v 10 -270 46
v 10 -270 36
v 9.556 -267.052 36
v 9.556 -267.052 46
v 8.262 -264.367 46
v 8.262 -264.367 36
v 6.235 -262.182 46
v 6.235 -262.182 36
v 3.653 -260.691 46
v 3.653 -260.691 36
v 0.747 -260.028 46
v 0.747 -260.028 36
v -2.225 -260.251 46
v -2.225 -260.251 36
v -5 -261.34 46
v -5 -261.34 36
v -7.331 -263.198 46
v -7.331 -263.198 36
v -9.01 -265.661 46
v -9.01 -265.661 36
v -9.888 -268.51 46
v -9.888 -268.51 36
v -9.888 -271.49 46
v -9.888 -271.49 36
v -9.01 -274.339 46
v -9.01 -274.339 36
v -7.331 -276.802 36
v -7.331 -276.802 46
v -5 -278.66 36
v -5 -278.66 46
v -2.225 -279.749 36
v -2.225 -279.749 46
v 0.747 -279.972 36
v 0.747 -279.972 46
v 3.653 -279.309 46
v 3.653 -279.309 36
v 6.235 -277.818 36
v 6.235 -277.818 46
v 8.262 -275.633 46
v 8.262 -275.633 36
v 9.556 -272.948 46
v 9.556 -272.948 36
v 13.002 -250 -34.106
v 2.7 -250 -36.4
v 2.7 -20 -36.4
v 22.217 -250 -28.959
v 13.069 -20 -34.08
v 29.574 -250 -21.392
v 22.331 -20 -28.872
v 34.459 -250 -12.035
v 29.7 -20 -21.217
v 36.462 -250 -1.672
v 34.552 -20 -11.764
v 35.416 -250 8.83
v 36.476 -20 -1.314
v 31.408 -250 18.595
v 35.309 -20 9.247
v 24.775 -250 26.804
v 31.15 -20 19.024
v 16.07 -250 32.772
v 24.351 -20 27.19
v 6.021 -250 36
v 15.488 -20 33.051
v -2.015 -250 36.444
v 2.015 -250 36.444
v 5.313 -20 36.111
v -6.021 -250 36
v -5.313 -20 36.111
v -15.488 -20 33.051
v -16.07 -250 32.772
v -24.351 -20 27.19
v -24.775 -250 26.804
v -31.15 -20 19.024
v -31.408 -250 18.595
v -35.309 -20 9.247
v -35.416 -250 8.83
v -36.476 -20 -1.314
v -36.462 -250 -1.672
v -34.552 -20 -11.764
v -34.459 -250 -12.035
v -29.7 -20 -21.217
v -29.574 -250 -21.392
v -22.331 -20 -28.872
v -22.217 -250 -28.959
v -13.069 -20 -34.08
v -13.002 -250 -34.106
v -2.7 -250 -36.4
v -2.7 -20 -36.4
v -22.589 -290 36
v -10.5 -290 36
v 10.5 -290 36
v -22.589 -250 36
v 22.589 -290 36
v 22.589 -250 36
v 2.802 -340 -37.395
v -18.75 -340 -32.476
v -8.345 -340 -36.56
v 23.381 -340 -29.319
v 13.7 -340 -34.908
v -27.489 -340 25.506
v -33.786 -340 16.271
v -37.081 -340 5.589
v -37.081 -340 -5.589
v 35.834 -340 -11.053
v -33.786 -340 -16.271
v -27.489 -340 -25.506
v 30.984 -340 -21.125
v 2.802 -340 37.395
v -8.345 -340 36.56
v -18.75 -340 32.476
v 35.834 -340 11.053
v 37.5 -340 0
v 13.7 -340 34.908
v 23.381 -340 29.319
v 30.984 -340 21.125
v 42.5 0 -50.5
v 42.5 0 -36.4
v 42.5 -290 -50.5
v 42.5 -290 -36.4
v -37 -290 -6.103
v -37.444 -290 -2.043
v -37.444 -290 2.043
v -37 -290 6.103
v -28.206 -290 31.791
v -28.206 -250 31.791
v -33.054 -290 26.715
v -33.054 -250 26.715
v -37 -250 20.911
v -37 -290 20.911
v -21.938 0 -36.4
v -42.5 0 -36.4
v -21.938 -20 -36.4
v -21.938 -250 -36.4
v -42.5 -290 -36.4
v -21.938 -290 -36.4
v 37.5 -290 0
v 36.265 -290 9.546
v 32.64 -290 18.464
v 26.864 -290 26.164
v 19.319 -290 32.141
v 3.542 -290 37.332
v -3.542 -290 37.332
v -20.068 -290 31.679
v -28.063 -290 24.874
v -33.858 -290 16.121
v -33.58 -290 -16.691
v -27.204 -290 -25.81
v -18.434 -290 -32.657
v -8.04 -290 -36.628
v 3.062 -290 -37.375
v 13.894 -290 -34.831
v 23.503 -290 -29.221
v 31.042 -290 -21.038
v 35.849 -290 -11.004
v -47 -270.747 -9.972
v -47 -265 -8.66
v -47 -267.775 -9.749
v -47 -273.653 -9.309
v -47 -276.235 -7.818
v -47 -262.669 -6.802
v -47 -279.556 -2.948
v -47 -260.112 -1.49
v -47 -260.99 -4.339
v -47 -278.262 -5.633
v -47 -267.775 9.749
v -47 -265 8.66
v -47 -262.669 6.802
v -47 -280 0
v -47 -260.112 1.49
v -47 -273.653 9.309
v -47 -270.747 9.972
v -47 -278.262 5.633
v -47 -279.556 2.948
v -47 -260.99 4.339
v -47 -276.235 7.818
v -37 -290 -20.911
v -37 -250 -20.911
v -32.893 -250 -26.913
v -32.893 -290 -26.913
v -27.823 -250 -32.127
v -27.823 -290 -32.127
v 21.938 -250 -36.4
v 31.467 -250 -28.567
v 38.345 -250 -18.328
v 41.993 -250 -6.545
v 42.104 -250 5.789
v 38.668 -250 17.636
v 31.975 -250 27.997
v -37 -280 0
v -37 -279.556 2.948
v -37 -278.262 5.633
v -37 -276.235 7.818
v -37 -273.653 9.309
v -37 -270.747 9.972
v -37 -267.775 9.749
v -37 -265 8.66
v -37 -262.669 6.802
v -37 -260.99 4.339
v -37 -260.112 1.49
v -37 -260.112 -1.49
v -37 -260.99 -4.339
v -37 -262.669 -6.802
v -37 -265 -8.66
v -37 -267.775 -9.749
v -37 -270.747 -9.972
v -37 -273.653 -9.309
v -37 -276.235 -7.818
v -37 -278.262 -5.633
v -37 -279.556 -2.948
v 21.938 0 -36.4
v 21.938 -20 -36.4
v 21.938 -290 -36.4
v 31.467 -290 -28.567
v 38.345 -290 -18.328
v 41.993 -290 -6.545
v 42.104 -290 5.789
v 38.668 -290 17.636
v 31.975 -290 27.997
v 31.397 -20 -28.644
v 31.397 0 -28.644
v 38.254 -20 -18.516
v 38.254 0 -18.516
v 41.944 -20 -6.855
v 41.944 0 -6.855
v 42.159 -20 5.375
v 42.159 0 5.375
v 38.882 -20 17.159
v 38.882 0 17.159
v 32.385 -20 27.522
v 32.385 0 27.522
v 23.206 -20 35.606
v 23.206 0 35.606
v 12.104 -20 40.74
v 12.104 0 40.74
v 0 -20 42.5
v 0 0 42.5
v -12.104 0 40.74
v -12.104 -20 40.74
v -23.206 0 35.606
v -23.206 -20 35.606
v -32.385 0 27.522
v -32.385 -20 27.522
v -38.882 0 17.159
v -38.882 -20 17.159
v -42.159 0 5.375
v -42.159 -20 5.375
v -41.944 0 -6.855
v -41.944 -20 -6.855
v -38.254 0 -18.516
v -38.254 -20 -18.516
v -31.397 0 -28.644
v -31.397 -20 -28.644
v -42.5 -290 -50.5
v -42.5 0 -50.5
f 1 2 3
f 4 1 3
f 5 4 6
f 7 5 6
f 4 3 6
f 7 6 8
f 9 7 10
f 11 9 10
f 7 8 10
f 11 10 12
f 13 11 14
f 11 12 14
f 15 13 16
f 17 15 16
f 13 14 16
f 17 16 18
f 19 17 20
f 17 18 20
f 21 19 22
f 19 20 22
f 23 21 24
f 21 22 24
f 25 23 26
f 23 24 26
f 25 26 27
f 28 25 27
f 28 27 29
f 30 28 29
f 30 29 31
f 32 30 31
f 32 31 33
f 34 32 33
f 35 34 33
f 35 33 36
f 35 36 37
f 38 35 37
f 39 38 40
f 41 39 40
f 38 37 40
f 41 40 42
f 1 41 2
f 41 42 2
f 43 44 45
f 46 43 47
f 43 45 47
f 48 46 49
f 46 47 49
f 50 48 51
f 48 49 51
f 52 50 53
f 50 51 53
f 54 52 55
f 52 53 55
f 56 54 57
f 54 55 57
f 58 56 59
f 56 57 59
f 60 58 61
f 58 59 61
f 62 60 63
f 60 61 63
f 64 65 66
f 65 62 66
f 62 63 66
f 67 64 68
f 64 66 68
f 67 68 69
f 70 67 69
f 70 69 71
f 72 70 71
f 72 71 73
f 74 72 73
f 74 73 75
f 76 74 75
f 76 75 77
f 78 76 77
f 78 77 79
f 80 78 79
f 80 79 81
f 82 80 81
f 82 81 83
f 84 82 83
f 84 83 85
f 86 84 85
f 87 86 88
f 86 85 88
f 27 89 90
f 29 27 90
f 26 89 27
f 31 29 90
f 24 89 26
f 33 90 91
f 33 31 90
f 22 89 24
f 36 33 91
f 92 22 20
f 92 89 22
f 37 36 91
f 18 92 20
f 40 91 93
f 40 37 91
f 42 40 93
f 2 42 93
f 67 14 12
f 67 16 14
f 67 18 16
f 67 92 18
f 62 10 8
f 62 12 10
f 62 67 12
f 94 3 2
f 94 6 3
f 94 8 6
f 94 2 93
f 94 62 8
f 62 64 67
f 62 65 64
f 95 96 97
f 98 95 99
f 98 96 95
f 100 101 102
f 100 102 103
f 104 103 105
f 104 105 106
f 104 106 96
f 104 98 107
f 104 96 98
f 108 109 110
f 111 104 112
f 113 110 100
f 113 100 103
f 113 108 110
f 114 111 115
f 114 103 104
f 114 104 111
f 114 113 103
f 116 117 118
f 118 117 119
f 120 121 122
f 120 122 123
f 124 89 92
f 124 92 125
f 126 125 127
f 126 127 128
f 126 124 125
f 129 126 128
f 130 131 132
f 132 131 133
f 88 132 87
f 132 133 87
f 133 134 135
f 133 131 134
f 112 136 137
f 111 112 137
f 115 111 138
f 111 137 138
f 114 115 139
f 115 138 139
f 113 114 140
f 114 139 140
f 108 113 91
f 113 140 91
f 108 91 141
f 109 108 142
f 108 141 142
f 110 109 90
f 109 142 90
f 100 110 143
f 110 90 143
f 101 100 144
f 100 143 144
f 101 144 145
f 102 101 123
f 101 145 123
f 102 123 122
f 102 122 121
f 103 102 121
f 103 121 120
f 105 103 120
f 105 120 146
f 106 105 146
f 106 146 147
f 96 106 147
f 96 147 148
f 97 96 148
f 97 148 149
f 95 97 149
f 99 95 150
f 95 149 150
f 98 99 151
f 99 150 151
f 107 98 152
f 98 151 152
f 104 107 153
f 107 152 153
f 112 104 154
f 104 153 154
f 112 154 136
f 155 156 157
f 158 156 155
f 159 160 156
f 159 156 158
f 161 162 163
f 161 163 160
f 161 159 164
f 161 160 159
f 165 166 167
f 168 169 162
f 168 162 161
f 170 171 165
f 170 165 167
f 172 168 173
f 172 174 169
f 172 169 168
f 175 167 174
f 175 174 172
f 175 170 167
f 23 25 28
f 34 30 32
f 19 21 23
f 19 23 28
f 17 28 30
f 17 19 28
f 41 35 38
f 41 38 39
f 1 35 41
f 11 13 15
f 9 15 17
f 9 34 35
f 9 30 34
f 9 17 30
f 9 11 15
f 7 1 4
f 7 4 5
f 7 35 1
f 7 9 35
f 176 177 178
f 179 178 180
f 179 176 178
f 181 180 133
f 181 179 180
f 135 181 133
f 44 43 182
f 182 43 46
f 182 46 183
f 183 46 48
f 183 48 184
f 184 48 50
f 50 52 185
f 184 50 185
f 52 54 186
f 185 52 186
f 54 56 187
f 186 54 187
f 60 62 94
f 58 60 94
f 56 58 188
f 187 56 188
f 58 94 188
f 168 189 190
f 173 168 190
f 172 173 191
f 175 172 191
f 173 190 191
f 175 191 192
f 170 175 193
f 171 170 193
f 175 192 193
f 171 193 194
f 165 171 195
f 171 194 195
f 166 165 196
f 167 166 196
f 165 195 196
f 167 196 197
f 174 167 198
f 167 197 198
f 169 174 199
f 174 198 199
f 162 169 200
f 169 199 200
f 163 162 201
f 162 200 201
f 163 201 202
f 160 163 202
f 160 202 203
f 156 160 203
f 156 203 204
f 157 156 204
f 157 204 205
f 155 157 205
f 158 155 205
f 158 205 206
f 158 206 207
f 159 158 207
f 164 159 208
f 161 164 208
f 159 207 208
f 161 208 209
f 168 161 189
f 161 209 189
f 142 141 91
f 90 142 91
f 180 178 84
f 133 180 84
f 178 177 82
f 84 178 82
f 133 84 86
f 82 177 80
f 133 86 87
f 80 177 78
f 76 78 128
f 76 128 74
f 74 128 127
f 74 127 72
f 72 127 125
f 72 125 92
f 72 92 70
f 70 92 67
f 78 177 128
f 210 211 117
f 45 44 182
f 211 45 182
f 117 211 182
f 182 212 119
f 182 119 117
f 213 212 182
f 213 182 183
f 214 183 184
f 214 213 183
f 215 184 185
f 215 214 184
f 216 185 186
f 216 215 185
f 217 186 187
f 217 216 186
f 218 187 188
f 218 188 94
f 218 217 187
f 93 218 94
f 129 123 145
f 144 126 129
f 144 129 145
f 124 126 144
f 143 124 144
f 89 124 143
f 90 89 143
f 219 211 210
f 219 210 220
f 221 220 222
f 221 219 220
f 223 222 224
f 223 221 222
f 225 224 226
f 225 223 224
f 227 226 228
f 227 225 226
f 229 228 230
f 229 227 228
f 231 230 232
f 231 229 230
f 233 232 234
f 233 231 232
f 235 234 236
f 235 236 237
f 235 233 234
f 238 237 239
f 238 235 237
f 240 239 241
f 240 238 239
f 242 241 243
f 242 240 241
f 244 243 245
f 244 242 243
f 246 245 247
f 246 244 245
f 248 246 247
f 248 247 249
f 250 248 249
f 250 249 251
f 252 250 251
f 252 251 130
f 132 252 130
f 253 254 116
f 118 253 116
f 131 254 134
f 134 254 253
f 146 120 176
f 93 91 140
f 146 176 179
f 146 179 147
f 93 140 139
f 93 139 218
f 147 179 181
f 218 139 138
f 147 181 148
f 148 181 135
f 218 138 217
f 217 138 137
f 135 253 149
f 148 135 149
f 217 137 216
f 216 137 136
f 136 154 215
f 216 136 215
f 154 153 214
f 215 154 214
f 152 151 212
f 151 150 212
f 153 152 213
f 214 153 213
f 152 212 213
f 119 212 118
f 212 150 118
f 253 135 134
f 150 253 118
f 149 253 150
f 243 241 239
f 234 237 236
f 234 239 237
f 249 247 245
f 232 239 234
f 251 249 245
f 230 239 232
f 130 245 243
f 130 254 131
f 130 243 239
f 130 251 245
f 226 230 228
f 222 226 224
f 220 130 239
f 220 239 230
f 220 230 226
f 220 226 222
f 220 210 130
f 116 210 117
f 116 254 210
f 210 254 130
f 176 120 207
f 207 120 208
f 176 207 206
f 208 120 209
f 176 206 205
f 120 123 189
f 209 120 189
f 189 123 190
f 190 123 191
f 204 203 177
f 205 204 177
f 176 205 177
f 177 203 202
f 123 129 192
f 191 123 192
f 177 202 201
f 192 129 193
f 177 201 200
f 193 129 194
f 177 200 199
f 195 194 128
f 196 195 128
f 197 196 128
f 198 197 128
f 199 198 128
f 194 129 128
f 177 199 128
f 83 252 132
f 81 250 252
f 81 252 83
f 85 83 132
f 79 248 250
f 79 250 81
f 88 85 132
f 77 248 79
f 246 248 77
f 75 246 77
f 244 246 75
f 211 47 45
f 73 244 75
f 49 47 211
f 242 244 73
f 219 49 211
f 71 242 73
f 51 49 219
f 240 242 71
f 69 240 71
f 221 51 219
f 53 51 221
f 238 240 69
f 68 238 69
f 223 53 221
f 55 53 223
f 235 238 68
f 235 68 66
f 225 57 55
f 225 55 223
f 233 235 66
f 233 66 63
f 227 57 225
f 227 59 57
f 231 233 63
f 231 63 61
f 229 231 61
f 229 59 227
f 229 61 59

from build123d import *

# Parameters (mm, degrees)
F0_R           = 36.5
F1_DEPTH       = 270
F4_DEPTH       = 30
F4_DEPTH_BACK  = 10
F7_DEPTH       = 10
F7_DEPTH_BACK  = 10
F9_DEPTH       = 230
F10_R          = 37.5
F11_DEPTH      = 50
F13_W          = 135.54436
F13_H          = 40
F14_DEPTH      = 10
F16_W          = 40
F16_H          = 117.55117
F17_DEPTH      = 15
F18_R          = 10
F19_DEPTH      = 10
F20_R          = 10
F21_DEPTH      = 10
F22_W          = 85
F22_H          = 290
F23_DEPTH      = 12
F23_DEPTH_BACK = 2.1


with BuildPart() as f1:
    # F0 (on Front) → F1 (new body)
    with BuildSketch(Plane.XZ):
        Circle(F0_R)
    extrude(amount=F1_DEPTH)

    # F3 (on offset) → F4 (join, two sides)
    with BuildSketch(Plane.XZ.offset(260)) as f4_sk:
        with BuildLine():
            Line((42.5, -36.5), (21.771541, -36.5))
            ThreePointArc((21.771541, -36.5), (0, 42.5), (-21.771541, -36.5))
            Line((-21.771541, -36.5), (-42.5, -36.5))
            Line((-42.5, -36.5), (-42.5, -38.5))
            Line((-42.5, -38.5), (42.5, -38.5))
            Line((42.5, -38.5), (42.5, -36.5))
        make_face()
    extrude(amount=F4_DEPTH)
    extrude(f4_sk.sketch, amount=-F4_DEPTH_BACK)

    # F6 (on offset) → F7 (join, two sides)
    with BuildSketch(Plane.XZ.offset(10)) as f7_sk:
        with BuildLine():
            Line((42.5, -36.5), (21.771541, -36.5))
            ThreePointArc((21.771541, -36.5), (0, 42.5), (-21.771541, -36.5))
            Line((-21.771541, -36.5), (-42.5, -36.5))
            Line((-42.5, -36.5), (-42.5, -38.5))
            Line((-42.5, -38.5), (42.5, -38.5))
            Line((42.5, -38.5), (42.5, -36.5))
        make_face()
    extrude(amount=F7_DEPTH)
    extrude(f7_sk.sketch, amount=-F7_DEPTH_BACK)

    # F8 (on face) → F9 (join, through all)
    with BuildSketch(Plane(origin=(0, -250, 0), x_dir=(-1, 0, 0), z_dir=(0, 1, 0))):
        Polygon((-42.5, -36.5), (-42.5, -38.5), (42.5, -38.5), (42.5, -36.5), (21.771541, -36.5), (0, -37.5), (-21.771541, -36.5), align=None)
    extrude(amount=F9_DEPTH)

    # F10 (on face) → F11 (join)
    with BuildSketch(Plane.XZ.offset(290)):
        Circle(F10_R)
    extrude(amount=F11_DEPTH)

    # F13 (on offset) → F14 (cut)
    with BuildSketch(Plane.XY.offset(46)):
        with Locations((0, -270)):
            Rectangle(F13_W, F13_H)
    extrude(amount=-F14_DEPTH, mode=Mode.SUBTRACT)

    # F16 (on offset) → F17 (cut)
    with BuildSketch(Plane.YZ.offset(-52)):
        with Locations((-270, 0)):
            Rectangle(F16_W, F16_H)
    extrude(amount=F17_DEPTH, mode=Mode.SUBTRACT)

    # F18 (on face) → F19 (join)
    with BuildSketch(Plane.XY.offset(36)):
        with Locations((0, -270)):
            Circle(F18_R)
    extrude(amount=F19_DEPTH)

    # F20 (on face) → F21 (join)
    with BuildSketch(Plane(origin=(-37, 0, 0), x_dir=(0, -1, 0), z_dir=(-1, 0, 0))):
        with Locations((270, 0)):
            Circle(F20_R)
    extrude(amount=F21_DEPTH)

    # F22 (on face) → F23 (join, two sides)
    with BuildSketch(Plane(origin=(0, 0, -38.5), x_dir=(1, 0, 0), z_dir=(0, 0, -1))) as f23_sk:
        with Locations((0, 145)):
            Rectangle(F22_W, F22_H)
    extrude(amount=F23_DEPTH)
    extrude(f23_sk.sketch, amount=-F23_DEPTH_BACK)


solid = f1.part
